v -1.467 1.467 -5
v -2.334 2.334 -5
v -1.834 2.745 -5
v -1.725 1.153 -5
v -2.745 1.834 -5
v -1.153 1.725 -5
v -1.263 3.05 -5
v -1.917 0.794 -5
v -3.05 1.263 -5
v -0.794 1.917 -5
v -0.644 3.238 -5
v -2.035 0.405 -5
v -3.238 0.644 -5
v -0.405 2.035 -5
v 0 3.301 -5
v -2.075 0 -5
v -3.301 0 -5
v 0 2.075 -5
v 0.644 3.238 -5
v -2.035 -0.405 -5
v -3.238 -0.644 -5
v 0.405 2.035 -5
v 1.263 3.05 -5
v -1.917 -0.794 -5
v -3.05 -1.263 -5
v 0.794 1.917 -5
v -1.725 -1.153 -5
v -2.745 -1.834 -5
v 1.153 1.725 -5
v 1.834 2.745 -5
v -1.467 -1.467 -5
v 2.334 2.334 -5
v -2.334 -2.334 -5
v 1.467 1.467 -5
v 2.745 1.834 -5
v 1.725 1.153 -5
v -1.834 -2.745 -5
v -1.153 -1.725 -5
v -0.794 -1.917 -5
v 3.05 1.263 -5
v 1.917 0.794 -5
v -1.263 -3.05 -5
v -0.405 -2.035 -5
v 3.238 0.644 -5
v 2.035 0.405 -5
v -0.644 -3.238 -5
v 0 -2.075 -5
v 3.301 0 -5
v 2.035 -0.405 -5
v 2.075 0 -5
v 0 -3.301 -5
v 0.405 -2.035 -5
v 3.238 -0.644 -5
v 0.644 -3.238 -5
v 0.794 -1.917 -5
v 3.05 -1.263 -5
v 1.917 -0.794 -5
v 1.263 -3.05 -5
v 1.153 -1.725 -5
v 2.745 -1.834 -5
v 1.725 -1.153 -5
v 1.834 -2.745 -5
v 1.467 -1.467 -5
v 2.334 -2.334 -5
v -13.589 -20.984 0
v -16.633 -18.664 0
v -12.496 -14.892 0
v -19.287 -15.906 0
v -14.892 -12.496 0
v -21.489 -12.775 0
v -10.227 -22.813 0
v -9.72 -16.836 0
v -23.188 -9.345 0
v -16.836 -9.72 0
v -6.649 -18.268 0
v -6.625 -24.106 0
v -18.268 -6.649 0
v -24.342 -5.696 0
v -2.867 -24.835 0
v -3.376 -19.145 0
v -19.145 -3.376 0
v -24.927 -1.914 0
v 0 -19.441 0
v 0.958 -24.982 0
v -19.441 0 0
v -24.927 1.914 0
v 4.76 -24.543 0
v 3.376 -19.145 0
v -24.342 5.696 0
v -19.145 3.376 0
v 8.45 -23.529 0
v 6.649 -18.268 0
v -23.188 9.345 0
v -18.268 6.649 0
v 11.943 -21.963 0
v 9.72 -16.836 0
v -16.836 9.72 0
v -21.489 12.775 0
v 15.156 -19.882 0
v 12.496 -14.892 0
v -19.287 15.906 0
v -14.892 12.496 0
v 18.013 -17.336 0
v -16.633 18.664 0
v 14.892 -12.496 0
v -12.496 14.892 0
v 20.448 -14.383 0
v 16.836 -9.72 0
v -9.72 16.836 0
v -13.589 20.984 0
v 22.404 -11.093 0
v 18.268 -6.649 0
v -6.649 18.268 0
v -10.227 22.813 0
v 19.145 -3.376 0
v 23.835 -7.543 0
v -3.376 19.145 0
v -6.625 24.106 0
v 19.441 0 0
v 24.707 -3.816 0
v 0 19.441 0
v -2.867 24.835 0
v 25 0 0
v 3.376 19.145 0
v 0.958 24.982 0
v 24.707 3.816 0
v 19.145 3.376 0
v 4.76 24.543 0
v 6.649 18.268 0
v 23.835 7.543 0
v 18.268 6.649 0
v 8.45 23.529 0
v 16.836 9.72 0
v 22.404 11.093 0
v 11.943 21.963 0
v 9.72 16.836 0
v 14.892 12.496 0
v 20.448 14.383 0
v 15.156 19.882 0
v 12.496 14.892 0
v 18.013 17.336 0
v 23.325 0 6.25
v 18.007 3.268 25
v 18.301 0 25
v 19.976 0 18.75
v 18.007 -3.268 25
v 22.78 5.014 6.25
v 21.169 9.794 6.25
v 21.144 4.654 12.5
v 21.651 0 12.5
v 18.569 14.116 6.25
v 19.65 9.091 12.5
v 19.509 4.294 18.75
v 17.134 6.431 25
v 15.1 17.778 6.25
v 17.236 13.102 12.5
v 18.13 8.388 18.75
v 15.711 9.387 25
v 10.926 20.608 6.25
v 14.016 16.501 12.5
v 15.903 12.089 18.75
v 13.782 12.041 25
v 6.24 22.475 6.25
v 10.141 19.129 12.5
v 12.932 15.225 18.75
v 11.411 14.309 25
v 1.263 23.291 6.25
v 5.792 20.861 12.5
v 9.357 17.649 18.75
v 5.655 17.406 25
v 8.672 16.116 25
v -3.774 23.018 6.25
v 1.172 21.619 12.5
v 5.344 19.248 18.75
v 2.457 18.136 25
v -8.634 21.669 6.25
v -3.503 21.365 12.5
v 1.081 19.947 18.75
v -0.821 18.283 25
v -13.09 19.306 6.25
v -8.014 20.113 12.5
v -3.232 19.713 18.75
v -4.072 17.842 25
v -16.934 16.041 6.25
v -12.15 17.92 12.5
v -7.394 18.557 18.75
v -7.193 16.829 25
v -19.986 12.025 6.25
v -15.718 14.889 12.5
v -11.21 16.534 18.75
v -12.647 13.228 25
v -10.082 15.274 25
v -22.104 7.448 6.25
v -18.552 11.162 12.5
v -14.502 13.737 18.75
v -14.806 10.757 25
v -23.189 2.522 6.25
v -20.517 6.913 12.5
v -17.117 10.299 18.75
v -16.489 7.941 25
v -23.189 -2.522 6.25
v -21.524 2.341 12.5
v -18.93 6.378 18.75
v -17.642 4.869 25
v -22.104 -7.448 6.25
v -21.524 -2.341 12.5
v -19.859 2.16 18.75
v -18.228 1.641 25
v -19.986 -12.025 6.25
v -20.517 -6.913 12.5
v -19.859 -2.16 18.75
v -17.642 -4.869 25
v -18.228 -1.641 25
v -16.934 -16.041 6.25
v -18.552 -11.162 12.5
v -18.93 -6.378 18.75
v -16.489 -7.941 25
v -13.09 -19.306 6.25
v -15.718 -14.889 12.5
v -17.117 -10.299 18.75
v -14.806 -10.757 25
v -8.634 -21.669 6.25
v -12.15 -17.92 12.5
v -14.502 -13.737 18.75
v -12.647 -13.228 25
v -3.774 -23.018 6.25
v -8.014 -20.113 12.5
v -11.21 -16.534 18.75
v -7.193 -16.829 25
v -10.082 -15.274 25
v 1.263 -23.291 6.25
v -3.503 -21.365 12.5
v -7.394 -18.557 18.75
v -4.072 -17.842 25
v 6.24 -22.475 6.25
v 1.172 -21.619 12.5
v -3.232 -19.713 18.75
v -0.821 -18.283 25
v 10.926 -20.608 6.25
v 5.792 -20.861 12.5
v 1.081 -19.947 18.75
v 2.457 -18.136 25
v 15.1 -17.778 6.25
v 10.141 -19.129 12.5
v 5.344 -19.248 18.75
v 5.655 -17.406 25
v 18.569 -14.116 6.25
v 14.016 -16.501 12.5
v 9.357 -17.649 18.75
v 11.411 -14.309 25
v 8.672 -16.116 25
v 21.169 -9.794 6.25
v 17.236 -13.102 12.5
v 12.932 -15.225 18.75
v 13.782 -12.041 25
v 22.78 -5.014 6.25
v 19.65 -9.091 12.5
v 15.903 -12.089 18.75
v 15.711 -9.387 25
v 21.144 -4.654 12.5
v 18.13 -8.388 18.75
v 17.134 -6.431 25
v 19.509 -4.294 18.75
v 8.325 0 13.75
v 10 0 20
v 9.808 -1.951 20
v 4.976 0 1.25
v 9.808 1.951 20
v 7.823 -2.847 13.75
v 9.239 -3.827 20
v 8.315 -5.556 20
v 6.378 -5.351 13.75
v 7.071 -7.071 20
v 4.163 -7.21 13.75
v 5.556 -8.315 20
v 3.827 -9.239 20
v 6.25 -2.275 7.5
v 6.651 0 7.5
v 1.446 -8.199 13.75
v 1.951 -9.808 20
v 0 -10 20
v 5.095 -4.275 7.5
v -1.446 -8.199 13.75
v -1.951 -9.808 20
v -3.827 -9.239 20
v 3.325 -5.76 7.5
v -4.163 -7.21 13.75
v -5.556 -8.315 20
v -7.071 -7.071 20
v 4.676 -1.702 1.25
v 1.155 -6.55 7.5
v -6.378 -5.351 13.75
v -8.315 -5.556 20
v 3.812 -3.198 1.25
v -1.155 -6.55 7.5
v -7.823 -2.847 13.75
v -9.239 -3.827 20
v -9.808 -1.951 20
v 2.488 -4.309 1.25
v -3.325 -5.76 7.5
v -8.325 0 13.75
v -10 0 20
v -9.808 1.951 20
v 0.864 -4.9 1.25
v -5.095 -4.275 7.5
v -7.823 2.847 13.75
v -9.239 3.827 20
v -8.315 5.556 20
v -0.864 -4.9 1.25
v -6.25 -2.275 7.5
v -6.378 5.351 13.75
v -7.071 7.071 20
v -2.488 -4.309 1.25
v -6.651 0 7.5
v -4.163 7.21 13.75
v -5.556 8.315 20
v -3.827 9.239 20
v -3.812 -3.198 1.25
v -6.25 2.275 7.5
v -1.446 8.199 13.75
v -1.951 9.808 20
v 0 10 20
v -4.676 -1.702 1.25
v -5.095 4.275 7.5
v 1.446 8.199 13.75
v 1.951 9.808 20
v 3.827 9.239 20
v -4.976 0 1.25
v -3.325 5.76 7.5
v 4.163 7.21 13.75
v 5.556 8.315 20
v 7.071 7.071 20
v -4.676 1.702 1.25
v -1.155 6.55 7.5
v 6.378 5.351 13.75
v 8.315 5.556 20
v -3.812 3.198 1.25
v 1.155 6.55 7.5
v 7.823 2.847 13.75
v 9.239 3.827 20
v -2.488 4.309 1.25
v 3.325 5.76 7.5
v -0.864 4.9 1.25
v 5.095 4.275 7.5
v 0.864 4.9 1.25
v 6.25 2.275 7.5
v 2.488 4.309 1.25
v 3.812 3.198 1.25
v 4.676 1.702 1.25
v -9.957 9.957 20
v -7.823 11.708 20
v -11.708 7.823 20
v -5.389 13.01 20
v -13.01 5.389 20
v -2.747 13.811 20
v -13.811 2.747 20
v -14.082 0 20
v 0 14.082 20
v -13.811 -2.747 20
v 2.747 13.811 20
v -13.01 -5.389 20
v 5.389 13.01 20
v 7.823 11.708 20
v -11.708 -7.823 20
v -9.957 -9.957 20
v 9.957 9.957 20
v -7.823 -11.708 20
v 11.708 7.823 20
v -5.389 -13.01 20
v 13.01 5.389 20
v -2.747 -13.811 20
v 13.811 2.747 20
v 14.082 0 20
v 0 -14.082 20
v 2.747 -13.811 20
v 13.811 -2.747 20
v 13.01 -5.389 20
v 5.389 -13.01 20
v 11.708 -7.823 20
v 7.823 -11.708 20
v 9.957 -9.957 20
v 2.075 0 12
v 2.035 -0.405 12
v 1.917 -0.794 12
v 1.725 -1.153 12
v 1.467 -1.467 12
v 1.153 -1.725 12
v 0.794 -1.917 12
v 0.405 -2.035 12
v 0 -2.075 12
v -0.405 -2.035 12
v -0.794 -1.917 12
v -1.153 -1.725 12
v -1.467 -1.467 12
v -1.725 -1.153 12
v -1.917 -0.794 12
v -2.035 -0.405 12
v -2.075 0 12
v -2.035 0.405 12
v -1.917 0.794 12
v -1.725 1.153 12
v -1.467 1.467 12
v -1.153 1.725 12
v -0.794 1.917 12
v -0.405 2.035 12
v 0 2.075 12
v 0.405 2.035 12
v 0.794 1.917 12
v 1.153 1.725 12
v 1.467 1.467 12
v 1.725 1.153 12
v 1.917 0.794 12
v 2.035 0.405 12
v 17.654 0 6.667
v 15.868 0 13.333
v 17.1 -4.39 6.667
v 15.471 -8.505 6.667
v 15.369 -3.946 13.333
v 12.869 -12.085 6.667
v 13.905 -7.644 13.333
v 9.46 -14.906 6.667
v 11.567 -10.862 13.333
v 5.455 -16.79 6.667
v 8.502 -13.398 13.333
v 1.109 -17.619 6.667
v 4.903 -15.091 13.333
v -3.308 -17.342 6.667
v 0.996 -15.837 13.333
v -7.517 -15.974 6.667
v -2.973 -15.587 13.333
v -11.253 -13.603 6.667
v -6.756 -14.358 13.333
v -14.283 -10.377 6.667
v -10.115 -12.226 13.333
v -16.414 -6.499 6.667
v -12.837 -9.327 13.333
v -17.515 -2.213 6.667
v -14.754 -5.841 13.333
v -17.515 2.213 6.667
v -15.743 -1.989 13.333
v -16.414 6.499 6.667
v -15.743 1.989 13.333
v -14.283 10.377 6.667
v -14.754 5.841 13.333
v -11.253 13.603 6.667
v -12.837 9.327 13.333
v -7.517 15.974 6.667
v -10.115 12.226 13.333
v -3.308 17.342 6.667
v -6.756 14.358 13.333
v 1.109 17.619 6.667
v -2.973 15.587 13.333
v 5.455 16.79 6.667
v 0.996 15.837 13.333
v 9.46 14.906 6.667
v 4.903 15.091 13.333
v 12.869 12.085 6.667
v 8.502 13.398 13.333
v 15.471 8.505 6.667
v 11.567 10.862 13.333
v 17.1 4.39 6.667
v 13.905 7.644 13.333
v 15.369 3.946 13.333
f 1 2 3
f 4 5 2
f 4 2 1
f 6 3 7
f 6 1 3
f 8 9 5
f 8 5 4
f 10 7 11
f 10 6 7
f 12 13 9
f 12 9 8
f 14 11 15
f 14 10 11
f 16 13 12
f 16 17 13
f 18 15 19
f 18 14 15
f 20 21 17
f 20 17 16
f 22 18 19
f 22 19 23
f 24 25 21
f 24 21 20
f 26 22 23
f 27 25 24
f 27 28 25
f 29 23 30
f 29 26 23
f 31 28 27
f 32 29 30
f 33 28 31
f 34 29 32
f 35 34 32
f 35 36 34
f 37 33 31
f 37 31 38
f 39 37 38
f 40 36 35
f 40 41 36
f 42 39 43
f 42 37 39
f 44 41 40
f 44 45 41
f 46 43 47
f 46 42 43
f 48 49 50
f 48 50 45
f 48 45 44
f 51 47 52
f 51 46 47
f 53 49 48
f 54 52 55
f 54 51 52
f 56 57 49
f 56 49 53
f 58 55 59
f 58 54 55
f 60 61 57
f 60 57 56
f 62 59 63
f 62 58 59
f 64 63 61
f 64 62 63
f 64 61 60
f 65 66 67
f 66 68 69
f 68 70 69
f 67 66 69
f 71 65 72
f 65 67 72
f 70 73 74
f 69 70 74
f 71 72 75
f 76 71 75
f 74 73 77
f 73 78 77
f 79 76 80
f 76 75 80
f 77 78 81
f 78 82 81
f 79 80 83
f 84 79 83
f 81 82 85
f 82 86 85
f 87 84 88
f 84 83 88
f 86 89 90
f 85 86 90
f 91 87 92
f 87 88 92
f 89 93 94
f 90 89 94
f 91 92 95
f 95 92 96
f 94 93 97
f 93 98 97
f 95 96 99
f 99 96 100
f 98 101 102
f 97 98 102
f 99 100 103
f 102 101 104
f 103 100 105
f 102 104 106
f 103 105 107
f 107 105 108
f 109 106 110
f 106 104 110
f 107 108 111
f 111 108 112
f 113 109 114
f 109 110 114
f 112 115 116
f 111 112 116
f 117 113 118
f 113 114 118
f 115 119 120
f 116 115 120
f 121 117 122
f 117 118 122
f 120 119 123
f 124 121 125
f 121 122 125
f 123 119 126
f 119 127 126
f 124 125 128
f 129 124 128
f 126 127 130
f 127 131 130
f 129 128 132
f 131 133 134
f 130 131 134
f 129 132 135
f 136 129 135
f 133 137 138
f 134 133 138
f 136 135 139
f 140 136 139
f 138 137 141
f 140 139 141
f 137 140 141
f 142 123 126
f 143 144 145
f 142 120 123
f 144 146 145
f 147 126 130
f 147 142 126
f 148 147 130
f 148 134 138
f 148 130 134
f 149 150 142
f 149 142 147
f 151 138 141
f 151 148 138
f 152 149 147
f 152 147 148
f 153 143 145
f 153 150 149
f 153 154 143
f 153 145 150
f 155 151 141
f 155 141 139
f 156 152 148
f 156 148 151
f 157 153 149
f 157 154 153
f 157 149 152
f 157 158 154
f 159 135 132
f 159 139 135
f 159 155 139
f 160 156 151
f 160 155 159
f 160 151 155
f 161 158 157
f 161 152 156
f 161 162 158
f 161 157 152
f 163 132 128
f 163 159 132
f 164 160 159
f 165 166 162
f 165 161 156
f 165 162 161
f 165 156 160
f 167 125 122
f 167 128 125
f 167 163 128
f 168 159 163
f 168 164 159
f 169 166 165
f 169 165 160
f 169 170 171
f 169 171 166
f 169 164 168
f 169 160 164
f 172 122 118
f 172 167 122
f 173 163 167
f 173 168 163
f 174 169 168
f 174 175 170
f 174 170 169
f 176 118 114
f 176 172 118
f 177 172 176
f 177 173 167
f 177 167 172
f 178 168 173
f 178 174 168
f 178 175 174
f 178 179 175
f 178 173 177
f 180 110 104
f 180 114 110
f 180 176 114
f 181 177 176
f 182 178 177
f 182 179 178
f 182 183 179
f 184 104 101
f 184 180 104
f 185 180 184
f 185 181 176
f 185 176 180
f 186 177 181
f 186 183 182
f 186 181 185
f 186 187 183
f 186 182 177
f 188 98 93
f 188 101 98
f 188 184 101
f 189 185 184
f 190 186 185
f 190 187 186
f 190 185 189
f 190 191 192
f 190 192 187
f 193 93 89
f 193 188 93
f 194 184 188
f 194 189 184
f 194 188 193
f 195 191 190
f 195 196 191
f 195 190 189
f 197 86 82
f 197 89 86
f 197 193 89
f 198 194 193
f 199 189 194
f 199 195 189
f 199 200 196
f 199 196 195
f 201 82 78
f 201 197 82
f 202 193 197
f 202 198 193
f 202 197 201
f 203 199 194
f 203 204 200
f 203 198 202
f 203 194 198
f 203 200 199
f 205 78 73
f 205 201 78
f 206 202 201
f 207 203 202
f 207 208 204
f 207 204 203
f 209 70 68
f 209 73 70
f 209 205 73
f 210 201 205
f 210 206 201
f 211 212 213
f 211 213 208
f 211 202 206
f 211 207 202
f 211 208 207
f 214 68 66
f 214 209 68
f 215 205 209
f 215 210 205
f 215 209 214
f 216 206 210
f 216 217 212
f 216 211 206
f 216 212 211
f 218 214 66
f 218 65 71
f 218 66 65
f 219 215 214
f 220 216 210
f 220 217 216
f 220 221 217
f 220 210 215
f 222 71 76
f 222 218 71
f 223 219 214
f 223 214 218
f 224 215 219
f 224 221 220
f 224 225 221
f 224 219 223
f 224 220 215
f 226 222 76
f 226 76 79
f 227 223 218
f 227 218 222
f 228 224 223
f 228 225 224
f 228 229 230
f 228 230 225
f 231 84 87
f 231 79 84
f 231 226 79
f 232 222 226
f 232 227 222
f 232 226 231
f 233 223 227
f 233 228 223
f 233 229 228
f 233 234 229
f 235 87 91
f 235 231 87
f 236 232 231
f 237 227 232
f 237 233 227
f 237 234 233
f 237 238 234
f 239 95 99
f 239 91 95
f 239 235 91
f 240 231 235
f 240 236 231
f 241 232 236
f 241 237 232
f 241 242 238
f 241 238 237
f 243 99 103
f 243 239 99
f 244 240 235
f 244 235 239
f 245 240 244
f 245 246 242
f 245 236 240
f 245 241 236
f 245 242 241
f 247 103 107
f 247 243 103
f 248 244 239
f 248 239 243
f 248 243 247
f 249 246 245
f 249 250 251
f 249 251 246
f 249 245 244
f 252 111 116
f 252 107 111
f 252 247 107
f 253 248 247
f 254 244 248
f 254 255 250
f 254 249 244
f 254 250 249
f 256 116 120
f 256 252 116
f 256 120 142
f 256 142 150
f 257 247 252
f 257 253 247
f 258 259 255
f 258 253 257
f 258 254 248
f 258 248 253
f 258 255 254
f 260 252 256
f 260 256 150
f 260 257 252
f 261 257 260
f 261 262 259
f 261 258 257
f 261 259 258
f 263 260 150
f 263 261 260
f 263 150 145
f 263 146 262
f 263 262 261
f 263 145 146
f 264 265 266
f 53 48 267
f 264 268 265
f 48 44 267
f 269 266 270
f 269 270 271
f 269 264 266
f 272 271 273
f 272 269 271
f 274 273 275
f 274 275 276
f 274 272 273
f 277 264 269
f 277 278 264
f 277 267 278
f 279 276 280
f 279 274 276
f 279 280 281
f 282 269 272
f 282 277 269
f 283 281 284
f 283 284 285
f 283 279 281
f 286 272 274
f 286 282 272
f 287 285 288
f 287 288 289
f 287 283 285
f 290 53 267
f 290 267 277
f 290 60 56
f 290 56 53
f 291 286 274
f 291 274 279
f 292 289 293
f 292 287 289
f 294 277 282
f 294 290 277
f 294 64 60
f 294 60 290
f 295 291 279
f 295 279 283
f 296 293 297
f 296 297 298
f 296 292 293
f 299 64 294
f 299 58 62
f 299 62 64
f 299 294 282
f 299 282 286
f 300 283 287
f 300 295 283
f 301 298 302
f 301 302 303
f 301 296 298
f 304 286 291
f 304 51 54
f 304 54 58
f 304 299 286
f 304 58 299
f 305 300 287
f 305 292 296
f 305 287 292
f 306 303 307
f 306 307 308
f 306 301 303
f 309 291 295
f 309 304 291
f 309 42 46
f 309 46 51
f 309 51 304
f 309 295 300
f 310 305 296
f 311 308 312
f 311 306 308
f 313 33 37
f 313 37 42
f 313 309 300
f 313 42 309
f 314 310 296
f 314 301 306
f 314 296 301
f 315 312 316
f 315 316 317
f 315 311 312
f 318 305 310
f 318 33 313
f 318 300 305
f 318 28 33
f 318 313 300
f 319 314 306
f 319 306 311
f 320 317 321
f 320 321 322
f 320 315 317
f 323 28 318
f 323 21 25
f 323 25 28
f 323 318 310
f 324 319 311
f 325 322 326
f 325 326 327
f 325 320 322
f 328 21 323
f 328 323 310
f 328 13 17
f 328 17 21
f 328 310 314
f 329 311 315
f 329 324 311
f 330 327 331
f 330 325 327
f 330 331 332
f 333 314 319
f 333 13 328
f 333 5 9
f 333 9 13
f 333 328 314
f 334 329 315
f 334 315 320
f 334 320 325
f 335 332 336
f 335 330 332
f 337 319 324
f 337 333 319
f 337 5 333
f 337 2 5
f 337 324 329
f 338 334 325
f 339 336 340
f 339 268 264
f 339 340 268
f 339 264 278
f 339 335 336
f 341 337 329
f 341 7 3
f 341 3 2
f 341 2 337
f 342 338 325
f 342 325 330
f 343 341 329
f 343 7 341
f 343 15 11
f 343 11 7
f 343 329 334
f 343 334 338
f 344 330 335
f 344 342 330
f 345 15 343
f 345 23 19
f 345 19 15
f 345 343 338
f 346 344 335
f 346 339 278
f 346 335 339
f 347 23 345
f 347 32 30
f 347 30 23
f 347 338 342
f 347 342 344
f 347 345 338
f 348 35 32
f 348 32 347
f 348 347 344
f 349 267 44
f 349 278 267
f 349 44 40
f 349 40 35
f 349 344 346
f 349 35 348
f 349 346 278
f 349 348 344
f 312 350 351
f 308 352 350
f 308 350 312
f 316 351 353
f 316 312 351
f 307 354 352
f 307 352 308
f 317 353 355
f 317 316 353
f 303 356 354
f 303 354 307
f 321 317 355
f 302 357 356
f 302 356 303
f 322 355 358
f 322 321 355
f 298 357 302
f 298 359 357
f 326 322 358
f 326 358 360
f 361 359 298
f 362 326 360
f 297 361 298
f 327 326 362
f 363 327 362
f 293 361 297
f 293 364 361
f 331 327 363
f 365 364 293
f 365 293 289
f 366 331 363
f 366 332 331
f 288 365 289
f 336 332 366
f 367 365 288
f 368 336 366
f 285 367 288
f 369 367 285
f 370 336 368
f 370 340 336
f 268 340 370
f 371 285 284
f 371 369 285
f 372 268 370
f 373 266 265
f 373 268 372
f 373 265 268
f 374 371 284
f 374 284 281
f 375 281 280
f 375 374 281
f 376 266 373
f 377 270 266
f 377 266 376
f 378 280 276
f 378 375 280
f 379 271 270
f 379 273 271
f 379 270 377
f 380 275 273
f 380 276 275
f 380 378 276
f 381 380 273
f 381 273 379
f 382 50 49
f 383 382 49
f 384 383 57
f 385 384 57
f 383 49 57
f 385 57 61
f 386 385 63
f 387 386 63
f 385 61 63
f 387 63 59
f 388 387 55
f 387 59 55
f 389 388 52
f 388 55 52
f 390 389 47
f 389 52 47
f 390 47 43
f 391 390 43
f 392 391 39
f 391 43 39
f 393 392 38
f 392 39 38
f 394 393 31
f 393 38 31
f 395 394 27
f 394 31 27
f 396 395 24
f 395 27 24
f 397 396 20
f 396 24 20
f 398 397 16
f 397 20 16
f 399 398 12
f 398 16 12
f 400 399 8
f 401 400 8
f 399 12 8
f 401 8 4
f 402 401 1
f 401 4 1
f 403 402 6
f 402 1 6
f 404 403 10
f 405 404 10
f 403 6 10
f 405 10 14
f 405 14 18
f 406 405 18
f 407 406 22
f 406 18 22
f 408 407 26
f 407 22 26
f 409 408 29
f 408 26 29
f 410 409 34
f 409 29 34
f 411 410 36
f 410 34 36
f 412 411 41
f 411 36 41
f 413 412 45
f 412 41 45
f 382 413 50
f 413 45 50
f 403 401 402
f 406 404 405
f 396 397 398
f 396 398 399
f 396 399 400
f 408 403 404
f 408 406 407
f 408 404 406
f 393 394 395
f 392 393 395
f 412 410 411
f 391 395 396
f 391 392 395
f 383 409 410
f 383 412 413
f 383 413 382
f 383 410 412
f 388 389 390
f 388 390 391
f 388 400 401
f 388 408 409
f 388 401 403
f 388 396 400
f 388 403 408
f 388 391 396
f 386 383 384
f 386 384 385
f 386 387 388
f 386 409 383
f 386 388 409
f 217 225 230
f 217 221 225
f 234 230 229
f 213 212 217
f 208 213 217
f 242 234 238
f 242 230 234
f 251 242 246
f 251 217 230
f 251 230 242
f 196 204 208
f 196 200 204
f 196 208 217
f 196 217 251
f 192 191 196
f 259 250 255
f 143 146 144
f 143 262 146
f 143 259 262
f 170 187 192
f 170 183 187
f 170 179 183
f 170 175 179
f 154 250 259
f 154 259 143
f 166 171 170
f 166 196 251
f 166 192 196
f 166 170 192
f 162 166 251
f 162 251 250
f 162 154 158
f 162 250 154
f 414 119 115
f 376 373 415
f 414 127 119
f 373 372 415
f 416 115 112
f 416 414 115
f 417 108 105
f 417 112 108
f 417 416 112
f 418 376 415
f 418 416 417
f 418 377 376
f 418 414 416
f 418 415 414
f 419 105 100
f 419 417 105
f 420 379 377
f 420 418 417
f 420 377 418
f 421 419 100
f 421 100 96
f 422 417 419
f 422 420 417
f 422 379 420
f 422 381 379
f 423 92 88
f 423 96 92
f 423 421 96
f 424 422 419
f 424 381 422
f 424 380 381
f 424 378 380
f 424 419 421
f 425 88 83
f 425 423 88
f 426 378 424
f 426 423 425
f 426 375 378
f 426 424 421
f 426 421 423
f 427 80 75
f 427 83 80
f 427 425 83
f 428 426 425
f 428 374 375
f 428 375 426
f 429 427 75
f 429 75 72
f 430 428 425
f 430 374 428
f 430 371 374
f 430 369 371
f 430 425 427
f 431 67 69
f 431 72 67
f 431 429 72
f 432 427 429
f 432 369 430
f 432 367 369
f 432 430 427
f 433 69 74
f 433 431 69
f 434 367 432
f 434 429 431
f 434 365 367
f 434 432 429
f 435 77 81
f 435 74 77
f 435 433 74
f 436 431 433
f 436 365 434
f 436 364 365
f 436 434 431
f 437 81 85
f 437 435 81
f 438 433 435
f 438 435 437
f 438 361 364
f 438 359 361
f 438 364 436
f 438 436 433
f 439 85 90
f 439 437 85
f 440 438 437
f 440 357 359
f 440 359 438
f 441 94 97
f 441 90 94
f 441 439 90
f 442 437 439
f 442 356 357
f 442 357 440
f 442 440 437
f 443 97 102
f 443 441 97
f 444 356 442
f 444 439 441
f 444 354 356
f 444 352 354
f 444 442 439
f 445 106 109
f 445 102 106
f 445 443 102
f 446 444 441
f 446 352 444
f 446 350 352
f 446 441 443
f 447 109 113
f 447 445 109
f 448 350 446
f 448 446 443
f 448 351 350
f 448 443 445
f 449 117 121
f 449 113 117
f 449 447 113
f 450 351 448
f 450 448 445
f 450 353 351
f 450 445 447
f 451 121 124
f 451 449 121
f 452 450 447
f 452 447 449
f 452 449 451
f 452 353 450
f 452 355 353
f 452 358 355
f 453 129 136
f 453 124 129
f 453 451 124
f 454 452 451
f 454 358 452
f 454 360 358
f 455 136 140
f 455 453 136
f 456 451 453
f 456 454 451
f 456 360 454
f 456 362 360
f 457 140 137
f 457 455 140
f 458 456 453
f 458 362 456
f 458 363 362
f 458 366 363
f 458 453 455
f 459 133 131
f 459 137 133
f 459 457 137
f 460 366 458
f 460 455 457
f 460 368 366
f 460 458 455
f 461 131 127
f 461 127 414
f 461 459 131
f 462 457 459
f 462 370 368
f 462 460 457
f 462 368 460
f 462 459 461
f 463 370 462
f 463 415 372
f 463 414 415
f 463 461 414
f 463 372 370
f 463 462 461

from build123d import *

# Parameters (mm, degrees)
SKETCH_R        = 25
PAD_DEPTH       = 25
PAD_TAPER       = 15
SKETCH001_R     = 19.440567
POCKET_DEPTH    = 20
POCKET_TAPER    = 15
SKETCH002_R     = 10
PAD001_DEPTH    = 25
PAD001_TAPER    = 15
SKETCH003_R     = 2.074758
POCKET001_DEPTH = 17


with BuildPart() as part:
    # Sketch → Pad (new body)
    with BuildSketch(Plane.XY):
        Circle(SKETCH_R)
    extrude(amount=PAD_DEPTH, taper=PAD_TAPER)

    # Sketch001 (on Face2 of Pad) → Pocket (cut)
    with BuildSketch(Plane(origin=(0, 0, 0), x_dir=(1, 0, 0), z_dir=(0, 0, -1))):
        Circle(SKETCH001_R)
    extrude(amount=-POCKET_DEPTH, taper=POCKET_TAPER, mode=Mode.SUBTRACT)

    # Sketch002 (on Face5 of Pocket) → Pad001 (join)
    with BuildSketch(Plane(origin=(0, 0, 20), x_dir=(1, 0, 0), z_dir=(0, 0, -1))):
        Circle(SKETCH002_R)
    extrude(amount=PAD001_DEPTH, taper=PAD001_TAPER)

    # Sketch003 (on Face7 of Pad001) → Pocket001 (cut)
    with BuildSketch(Plane(origin=(0, 0, -5), x_dir=(1, 0, 0), z_dir=(0, 0, -1))):
        Circle(SKETCH003_R)
    extrude(amount=-POCKET001_DEPTH, mode=Mode.SUBTRACT)


solid = part.part
